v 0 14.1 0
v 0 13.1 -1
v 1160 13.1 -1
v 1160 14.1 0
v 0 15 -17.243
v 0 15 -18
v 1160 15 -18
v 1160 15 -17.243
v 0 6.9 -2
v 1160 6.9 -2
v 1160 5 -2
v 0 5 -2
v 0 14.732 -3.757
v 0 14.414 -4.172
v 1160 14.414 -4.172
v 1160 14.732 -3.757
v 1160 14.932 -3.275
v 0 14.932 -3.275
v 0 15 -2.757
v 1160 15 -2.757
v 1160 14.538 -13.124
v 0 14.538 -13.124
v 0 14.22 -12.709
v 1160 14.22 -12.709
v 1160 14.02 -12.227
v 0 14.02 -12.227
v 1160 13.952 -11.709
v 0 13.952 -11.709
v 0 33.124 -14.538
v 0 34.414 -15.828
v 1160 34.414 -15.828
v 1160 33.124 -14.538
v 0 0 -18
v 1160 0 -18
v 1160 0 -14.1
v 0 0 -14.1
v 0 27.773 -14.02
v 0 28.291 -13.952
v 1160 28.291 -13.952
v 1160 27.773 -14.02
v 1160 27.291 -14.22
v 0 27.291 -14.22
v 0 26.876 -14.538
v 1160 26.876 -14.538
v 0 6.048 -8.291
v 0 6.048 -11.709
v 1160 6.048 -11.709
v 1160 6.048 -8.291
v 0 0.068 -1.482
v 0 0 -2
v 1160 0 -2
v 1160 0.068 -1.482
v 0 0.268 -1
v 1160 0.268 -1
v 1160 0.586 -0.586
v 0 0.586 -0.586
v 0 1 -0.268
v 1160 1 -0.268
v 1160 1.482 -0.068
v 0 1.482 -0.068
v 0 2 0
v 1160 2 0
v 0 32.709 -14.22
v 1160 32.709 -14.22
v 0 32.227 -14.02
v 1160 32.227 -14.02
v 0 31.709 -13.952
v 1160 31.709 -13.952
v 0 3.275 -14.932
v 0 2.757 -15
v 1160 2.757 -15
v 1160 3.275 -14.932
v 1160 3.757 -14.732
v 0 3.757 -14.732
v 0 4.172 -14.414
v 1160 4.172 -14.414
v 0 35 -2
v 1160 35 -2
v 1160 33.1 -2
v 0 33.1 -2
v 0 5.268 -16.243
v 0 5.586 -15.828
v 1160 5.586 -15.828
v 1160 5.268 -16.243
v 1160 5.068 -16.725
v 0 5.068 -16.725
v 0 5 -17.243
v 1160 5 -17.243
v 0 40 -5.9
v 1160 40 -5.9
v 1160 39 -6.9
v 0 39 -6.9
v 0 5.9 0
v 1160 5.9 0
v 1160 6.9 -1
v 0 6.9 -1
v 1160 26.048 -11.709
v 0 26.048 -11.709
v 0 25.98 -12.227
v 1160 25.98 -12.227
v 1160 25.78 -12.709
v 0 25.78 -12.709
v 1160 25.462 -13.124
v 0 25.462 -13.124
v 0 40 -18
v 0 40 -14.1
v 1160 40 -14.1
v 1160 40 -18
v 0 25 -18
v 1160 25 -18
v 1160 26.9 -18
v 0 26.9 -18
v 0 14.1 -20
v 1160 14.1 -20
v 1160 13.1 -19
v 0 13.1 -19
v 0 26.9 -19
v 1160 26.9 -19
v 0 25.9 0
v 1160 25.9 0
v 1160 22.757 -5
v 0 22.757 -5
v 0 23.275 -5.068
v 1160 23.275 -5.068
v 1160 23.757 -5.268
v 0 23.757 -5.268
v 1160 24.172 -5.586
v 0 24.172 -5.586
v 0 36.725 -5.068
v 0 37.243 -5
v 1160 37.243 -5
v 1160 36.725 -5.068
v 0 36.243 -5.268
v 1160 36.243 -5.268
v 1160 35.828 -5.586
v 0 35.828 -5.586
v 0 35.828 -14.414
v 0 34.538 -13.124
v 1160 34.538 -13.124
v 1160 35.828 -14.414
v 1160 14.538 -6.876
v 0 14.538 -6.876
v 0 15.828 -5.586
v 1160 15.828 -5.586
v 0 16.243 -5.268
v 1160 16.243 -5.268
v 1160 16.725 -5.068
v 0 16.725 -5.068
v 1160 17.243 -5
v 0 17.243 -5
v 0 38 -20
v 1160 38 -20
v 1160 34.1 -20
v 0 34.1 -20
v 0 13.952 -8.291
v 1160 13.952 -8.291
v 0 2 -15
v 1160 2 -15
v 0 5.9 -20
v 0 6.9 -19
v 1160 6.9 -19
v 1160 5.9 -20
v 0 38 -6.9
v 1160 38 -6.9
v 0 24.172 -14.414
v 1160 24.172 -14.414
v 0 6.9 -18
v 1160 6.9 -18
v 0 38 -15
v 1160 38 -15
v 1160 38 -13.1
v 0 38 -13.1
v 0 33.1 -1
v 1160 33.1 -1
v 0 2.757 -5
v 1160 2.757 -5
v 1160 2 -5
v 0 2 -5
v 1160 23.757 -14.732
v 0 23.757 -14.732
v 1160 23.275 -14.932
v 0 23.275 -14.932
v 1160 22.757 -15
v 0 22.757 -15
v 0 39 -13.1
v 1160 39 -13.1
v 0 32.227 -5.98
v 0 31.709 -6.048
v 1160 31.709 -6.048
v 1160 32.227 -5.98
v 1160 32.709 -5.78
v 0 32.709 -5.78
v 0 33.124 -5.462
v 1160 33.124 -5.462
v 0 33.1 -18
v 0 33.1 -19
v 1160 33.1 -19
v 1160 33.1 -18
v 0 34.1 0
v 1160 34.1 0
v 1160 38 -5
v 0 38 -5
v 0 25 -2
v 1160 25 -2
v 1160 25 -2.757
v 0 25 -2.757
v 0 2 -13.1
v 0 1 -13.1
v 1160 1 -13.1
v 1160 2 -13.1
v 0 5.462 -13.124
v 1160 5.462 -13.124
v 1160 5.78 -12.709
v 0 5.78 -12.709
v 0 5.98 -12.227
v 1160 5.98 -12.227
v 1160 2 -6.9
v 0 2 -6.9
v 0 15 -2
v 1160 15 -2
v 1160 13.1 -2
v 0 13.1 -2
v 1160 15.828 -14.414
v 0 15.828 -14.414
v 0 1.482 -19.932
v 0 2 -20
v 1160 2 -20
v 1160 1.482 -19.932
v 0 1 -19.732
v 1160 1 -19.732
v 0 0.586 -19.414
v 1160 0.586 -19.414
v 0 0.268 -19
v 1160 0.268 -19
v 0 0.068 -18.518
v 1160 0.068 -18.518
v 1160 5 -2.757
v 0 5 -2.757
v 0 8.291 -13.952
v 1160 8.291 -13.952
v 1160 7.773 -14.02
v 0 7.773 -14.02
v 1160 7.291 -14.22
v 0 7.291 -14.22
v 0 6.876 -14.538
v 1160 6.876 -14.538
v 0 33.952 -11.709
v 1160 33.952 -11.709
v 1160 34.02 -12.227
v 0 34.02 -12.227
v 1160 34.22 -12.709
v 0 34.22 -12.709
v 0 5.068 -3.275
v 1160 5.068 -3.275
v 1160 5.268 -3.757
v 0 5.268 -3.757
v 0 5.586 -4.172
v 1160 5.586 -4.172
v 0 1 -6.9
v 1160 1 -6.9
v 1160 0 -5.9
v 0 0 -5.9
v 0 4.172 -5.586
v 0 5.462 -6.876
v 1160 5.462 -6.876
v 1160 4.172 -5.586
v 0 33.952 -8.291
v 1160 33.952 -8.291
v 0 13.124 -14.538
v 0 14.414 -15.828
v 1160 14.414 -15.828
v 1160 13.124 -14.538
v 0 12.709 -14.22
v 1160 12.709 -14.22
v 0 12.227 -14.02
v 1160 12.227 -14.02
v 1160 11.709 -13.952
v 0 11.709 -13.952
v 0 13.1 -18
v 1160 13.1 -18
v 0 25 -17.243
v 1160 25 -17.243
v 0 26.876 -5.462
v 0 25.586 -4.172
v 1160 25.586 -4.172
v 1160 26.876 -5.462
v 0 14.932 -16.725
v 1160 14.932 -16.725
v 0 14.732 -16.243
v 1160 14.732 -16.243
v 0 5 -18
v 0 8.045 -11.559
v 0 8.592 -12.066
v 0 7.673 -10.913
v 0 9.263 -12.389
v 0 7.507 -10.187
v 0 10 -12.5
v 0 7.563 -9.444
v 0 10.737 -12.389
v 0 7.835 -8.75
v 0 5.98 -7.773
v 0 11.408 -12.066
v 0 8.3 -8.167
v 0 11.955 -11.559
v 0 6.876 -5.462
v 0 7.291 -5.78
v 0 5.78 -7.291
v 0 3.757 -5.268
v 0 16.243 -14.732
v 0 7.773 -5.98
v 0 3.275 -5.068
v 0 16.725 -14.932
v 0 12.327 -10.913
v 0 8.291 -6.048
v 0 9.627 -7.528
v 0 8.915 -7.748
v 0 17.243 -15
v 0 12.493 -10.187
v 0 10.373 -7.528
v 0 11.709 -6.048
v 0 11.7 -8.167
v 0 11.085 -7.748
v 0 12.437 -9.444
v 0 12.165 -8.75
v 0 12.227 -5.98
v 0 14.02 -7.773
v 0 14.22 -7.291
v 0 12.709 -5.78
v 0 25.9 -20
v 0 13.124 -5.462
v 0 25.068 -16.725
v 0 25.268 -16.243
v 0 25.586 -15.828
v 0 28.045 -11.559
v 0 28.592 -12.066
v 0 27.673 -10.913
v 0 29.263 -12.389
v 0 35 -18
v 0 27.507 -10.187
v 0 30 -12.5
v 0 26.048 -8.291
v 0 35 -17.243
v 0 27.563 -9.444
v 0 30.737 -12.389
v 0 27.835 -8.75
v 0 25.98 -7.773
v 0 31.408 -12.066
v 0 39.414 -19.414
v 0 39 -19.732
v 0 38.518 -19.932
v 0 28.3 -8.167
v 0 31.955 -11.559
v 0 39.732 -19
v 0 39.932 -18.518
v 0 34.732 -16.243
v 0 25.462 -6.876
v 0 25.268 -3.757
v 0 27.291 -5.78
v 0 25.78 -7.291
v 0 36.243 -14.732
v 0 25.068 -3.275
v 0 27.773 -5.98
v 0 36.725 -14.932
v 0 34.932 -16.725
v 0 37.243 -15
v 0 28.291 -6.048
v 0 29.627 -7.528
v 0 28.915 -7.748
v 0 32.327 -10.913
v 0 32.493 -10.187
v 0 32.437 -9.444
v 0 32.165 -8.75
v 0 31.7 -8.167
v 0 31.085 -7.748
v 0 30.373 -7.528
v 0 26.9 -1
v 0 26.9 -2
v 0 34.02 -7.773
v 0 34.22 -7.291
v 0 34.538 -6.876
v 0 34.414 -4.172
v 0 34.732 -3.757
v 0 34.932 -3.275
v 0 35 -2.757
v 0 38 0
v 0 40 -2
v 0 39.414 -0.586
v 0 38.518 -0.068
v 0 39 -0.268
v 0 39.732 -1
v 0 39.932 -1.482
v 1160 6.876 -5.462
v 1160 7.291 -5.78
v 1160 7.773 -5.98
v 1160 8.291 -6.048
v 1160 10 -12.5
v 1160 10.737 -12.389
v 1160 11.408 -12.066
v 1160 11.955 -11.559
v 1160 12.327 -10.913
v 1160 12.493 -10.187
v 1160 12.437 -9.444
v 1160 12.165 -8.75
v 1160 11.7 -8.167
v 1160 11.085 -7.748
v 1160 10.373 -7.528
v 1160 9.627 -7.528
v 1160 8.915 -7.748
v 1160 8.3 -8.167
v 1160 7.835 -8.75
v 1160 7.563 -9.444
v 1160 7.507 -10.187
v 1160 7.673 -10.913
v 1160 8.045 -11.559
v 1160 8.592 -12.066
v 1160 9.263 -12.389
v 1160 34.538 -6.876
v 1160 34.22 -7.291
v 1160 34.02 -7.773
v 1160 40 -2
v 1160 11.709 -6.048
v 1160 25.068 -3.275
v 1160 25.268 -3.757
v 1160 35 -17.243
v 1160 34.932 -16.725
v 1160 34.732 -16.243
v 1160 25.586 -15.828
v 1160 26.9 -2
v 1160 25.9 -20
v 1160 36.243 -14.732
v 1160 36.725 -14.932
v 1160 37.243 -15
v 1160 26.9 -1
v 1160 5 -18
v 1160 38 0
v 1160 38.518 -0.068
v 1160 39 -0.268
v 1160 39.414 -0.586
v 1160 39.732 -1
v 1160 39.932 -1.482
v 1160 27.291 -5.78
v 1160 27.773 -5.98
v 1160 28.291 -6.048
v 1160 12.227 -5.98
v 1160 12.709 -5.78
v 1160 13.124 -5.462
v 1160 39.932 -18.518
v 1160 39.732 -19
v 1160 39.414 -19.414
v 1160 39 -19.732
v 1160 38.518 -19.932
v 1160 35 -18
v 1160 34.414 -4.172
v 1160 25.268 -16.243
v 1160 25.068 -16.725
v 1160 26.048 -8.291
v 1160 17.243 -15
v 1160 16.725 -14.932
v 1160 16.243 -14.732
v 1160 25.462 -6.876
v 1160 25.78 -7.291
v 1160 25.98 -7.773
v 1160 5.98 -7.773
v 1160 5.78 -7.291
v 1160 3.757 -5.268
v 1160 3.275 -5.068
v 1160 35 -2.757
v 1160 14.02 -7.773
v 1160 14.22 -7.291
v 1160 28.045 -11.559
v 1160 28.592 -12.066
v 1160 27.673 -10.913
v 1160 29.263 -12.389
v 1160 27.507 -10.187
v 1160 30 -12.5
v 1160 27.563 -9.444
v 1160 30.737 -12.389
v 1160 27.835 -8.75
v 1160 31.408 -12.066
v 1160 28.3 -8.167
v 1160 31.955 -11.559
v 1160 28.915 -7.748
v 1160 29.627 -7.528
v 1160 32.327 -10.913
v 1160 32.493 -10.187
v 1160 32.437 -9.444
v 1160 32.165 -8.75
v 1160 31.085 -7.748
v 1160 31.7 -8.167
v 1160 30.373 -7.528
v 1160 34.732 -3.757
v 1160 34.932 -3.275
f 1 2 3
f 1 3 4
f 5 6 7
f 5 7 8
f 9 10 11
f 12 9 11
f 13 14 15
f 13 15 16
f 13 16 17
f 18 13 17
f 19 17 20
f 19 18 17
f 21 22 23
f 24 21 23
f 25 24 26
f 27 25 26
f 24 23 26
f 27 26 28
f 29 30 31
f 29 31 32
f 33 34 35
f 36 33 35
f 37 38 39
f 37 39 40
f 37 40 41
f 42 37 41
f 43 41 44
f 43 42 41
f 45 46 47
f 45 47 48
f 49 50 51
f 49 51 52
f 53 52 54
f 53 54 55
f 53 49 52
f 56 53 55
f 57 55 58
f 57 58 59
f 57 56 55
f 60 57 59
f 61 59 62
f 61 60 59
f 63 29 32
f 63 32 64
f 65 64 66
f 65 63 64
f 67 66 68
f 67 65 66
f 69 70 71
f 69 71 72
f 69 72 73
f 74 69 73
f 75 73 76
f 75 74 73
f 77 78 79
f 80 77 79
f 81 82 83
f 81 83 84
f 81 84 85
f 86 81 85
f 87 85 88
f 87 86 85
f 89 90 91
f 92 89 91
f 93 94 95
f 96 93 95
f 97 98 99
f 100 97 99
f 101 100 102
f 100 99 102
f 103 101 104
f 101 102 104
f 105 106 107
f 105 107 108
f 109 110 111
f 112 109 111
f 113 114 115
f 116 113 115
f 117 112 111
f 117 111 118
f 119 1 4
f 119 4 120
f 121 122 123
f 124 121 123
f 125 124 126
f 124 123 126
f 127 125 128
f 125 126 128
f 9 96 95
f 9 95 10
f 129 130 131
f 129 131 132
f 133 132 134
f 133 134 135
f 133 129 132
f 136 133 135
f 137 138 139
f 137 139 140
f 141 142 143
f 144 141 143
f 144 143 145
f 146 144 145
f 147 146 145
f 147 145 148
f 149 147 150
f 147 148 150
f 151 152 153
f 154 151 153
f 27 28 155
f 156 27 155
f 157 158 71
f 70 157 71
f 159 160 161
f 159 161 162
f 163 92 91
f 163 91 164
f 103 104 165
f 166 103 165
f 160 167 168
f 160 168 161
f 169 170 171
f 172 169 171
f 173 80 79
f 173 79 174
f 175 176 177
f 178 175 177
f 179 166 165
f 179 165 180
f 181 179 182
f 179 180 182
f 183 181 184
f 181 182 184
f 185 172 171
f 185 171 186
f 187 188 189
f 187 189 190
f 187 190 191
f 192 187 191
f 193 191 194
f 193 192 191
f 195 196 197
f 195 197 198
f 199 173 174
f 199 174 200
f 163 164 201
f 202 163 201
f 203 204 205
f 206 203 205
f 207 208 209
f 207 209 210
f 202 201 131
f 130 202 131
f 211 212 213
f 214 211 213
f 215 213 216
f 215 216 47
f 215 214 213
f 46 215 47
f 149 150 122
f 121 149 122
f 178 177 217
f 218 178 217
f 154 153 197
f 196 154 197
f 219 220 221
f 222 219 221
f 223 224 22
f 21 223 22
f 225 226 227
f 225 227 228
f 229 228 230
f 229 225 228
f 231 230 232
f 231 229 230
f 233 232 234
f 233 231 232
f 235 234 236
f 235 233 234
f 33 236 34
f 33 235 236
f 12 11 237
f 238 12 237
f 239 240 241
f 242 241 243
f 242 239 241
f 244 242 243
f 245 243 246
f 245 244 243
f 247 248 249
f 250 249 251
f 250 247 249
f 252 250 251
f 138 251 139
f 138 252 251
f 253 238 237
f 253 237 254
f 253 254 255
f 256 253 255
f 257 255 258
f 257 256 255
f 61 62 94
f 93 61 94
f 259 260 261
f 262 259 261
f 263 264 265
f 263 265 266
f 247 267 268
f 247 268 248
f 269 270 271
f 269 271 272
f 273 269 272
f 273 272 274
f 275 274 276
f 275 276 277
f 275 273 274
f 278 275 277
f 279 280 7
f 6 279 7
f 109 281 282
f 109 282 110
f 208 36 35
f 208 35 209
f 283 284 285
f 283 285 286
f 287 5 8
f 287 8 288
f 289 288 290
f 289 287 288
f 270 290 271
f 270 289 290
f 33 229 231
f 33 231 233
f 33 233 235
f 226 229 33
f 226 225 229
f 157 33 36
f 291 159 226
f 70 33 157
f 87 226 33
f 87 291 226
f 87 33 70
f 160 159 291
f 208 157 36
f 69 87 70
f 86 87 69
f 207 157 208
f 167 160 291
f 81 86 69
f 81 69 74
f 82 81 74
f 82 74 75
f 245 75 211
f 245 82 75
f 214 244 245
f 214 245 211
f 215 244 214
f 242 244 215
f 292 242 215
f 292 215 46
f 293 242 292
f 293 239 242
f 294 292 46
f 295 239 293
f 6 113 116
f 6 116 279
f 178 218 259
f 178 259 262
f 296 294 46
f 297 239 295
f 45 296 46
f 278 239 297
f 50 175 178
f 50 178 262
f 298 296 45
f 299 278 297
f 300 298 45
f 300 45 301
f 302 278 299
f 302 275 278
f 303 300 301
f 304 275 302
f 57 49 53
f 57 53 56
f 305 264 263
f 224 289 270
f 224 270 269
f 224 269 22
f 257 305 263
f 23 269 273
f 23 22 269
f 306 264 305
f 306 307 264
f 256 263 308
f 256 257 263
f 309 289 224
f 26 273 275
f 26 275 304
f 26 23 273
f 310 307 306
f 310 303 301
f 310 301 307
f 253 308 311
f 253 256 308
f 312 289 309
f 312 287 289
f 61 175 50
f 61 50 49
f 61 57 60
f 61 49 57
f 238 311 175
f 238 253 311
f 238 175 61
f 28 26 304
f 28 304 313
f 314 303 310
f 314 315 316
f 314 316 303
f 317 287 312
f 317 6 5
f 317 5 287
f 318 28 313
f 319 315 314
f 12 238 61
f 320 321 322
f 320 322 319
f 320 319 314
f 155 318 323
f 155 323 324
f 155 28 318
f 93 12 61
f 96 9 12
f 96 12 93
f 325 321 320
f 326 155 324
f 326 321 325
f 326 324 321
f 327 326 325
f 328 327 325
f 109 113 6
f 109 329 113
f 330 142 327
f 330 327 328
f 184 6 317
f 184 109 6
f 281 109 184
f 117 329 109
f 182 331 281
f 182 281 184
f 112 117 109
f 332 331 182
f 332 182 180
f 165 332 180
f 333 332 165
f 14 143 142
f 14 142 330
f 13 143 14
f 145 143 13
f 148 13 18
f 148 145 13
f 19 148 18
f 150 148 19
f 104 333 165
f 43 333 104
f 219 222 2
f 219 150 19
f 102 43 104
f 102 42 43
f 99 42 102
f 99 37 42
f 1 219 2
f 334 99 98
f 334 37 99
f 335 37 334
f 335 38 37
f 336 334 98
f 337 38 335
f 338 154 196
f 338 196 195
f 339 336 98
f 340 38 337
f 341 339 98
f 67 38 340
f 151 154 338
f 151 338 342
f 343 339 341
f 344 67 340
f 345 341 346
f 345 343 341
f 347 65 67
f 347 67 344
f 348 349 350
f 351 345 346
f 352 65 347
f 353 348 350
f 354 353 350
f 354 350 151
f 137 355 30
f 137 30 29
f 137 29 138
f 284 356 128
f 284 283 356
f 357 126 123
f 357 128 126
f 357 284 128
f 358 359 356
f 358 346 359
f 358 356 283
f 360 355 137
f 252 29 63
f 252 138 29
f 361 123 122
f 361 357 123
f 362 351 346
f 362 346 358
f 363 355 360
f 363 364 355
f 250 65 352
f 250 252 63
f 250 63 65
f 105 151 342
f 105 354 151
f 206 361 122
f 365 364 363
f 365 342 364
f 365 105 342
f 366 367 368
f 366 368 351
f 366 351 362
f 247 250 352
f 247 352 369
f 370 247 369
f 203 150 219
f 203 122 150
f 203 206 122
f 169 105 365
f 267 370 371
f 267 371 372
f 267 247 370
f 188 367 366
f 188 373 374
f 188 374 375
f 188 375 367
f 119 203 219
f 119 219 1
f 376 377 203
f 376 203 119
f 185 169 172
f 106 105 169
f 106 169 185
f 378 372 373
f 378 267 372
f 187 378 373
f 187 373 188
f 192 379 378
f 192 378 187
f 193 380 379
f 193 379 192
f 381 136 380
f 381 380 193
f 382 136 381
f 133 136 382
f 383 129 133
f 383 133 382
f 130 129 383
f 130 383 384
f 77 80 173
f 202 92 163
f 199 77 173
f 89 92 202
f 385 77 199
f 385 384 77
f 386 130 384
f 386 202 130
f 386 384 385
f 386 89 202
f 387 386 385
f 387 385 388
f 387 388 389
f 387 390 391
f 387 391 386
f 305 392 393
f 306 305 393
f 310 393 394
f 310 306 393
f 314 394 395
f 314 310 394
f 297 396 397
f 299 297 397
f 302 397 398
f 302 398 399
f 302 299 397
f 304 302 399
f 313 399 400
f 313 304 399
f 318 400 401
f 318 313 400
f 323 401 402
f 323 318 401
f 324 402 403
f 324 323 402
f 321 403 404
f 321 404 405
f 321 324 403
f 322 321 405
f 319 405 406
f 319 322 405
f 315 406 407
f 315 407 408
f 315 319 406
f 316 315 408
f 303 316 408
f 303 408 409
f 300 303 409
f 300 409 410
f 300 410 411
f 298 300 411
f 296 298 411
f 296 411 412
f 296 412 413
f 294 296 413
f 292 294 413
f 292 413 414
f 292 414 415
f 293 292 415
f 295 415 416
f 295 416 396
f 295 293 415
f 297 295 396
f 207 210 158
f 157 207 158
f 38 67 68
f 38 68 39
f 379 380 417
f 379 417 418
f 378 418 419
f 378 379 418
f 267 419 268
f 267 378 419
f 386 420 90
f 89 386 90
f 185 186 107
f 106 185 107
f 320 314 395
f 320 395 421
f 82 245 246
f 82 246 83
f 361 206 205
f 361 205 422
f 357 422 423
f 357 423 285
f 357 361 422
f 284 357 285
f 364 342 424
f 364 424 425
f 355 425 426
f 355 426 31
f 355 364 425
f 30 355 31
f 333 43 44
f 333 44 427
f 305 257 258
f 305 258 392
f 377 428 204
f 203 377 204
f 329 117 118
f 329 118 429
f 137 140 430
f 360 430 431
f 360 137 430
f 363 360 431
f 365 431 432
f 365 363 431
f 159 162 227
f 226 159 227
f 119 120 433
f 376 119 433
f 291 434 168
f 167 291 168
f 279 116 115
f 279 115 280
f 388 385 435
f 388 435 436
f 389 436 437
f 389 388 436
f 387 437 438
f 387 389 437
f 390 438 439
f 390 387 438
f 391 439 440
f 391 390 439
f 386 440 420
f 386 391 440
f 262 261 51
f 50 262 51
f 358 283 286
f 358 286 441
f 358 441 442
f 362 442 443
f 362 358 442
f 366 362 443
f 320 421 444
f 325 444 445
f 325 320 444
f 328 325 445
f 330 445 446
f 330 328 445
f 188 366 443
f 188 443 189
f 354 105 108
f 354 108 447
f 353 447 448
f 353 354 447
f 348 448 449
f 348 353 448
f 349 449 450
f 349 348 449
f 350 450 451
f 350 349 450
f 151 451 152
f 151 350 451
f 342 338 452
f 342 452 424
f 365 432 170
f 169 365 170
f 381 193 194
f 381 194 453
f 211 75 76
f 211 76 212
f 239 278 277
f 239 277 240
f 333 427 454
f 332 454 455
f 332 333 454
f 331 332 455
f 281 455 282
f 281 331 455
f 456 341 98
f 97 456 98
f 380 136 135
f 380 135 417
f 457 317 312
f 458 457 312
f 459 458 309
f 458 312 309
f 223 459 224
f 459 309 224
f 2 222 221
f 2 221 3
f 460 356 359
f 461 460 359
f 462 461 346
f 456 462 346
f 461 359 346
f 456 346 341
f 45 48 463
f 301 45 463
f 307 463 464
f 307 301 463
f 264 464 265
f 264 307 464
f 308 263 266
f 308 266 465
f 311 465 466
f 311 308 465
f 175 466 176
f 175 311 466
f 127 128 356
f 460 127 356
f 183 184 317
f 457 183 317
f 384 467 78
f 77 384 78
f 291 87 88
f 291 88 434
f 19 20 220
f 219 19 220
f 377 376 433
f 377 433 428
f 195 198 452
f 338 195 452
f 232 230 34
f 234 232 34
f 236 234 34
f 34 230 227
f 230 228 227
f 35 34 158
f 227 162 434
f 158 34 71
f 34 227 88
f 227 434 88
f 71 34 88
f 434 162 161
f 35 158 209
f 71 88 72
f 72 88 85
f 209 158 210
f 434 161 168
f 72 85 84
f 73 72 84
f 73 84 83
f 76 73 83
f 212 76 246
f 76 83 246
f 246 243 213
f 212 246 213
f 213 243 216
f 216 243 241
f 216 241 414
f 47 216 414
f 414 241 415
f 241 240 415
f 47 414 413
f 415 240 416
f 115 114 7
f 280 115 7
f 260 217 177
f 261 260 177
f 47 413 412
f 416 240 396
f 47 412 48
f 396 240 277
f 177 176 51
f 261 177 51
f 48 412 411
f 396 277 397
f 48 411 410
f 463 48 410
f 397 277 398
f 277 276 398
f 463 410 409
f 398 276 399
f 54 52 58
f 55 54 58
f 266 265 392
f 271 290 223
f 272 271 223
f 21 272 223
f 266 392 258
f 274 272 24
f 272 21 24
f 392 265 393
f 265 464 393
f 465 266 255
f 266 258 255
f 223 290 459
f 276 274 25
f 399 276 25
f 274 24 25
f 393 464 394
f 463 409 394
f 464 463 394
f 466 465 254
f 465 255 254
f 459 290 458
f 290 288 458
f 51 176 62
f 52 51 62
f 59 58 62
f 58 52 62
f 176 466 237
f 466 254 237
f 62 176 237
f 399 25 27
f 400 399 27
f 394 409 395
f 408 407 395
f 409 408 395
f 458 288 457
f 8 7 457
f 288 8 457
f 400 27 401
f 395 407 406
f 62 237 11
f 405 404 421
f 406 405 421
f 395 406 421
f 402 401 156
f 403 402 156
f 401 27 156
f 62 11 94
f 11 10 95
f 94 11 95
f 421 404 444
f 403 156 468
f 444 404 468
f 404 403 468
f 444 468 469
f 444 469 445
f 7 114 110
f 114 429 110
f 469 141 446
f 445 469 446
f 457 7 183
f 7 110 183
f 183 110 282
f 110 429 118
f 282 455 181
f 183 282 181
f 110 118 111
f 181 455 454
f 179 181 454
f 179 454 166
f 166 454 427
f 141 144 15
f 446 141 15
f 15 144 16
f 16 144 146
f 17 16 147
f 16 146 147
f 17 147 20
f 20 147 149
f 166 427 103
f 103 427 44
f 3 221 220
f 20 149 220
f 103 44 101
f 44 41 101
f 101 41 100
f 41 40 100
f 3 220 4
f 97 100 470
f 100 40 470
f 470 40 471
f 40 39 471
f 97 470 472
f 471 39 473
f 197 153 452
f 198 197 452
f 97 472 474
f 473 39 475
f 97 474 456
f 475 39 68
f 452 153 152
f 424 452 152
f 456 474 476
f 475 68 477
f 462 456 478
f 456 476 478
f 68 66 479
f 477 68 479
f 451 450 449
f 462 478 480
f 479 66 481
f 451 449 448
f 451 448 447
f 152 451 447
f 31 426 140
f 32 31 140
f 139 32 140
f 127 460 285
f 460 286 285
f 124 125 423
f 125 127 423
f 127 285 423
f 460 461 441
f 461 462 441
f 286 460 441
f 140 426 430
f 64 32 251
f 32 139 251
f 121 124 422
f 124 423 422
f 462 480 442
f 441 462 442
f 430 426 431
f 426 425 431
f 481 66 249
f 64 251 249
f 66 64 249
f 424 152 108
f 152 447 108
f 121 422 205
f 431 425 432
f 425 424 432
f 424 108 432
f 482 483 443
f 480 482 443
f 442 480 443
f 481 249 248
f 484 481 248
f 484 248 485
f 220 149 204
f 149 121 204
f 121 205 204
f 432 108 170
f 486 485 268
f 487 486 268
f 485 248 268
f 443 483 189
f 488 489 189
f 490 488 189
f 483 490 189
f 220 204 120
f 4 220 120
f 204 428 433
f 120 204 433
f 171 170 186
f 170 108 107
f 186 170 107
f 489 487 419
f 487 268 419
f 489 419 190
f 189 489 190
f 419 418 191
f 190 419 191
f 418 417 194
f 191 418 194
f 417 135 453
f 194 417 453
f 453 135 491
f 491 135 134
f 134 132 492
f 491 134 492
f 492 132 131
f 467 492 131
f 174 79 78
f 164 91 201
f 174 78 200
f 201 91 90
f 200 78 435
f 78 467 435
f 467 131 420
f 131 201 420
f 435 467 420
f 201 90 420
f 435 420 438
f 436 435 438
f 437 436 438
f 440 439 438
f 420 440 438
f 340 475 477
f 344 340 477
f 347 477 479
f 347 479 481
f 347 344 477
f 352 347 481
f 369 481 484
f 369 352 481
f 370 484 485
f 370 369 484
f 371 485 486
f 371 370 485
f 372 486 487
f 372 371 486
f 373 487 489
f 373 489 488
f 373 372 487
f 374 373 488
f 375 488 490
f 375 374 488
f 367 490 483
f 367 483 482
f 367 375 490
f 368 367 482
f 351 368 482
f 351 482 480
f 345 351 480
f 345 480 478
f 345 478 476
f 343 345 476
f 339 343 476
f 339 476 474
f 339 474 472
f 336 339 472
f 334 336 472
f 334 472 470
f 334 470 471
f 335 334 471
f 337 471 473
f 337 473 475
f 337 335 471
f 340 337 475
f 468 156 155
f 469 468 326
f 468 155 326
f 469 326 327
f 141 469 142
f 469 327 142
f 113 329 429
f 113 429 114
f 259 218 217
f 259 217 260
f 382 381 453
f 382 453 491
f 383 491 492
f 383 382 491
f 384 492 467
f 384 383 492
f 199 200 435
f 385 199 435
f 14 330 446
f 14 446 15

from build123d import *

# Parameters (mm, degrees)
SKETCH1_R           = 2.5
BOSS_EXTRUDE1_DEPTH = 1160


with BuildPart() as part:
    # Sketch1 → Boss-Extrude1 (new body)
    with BuildSketch(Plane(origin=(0, 0, 0), x_dir=(0, 0, -1), z_dir=(1, 0, 0))):
        with BuildLine():
            Line((6.9, 38), (5, 38))
            Line((5, 38), (5, 37.242640687))
            ThreePointArc((5, 37.242640687), (5.152240935, 36.477273822), (5.585786438, 35.828427125))
            Line((5.585786438, 35.828427125), (6.876358939, 34.537854624))
            ThreePointArc((6.876358939, 34.537854624), (7.525205636, 34.104309121), (8.290572501, 33.952068186))
            Line((8.290572501, 33.952068186), (11.709427499, 33.952068186))
            ThreePointArc((11.709427499, 33.952068186), (12.474794364, 34.104309121), (13.123641061, 34.537854624))
            Line((13.123641061, 34.537854624), (14.414213562, 35.828427125))
            ThreePointArc((14.414213562, 35.828427125), (14.847759065, 36.477273822), (15, 37.242640687))
            Line((15, 37.242640687), (15, 38))
            Line((15, 38), (13.1, 38))
            Line((13.1, 38), (13.1, 39))
            Line((13.1, 39), (14.1, 40))
            Line((14.1, 40), (18, 40))
            ThreePointArc((18, 40), (19.414213562, 39.414213562), (20, 38))
            Line((20, 38), (20, 34.1))
            Line((20, 34.1), (19, 33.1))
            Line((19, 33.1), (18, 33.1))
            Line((18, 33.1), (18, 35))
            Line((18, 35), (17.242640687, 35))
            ThreePointArc((17.242640687, 35), (16.477273822, 34.847759065), (15.828427125, 34.414213562))
            Line((15.828427125, 34.414213562), (14.537854624, 33.123641061))
            ThreePointArc((14.537854624, 33.123641061), (14.104309121, 32.474794364), (13.952068186, 31.709427499))
            Line((13.952068186, 31.709427499), (13.952068186, 28.290572501))
            ThreePointArc((13.952068186, 28.290572501), (14.104309121, 27.525205636), (14.537854624, 26.876358939))
            Line((14.537854624, 26.876358939), (15.828427125, 25.585786438))
            ThreePointArc((15.828427125, 25.585786438), (16.477273822, 25.152240935), (17.242640687, 25))
            Line((17.242640687, 25), (18, 25))
            Line((18, 25), (18, 26.9))
            Line((18, 26.9), (19, 26.9))
            Line((19, 26.9), (20, 25.9))
            Line((20, 25.9), (20, 14.1))
            Line((20, 14.1), (19, 13.1))
            Line((19, 13.1), (18, 13.1))
            Line((18, 13.1), (18, 15))
            Line((18, 15), (17.242640687, 15))
            ThreePointArc((17.242640687, 15), (16.477273822, 14.847759065), (15.828427125, 14.414213562))
            Line((15.828427125, 14.414213562), (14.537854624, 13.123641061))
            ThreePointArc((14.537854624, 13.123641061), (14.104309121, 12.474794364), (13.952068186, 11.709427499))
            Line((13.952068186, 11.709427499), (13.952068186, 8.290572501))
            ThreePointArc((13.952068186, 8.290572501), (14.104309121, 7.525205636), (14.537854624, 6.876358939))
            Line((14.537854624, 6.876358939), (15.828427125, 5.585786438))
            ThreePointArc((15.828427125, 5.585786438), (16.477273822, 5.152240935), (17.242640687, 5))
            Line((17.242640687, 5), (18, 5))
            Line((18, 5), (18, 6.9))
            Line((18, 6.9), (19, 6.9))
            Line((19, 6.9), (20, 5.9))
            Line((20, 5.9), (20, 2))
            ThreePointArc((20, 2), (19.414213562, 0.585786438), (18, 0))
            Line((18, 0), (14.1, 0))
            Line((14.1, 0), (13.1, 1))
            Line((13.1, 1), (13.1, 2))
            Line((13.1, 2), (15, 2))
            Line((15, 2), (15, 2.757359313))
            ThreePointArc((15, 2.757359313), (14.847759065, 3.522726178), (14.414213562, 4.171572875))
            Line((14.414213562, 4.171572875), (13.123641061, 5.462145376))
            ThreePointArc((13.123641061, 5.462145376), (12.474794364, 5.895690879), (11.709427499, 6.047931814))
            Line((11.709427499, 6.047931814), (8.290572501, 6.047931814))
            ThreePointArc((8.290572501, 6.047931814), (7.525205636, 5.895690879), (6.876358939, 5.462145376))
            Line((6.876358939, 5.462145376), (5.585786438, 4.171572875))
            ThreePointArc((5.585786438, 4.171572875), (5.152240935, 3.522726178), (5, 2.757359313))
            Line((5, 2.757359313), (5, 2))
            Line((5, 2), (6.9, 2))
            Line((6.9, 2), (6.9, 1))
            Line((6.9, 1), (5.9, 0))
            Line((5.9, 0), (2, 0))
            ThreePointArc((2, 0), (0.585786438, 0.585786438), (0, 2))
            Line((0, 2), (0, 5.9))
            Line((0, 5.9), (1, 6.9))
            Line((1, 6.9), (2, 6.9))
            Line((2, 6.9), (2, 5))
            Line((2, 5), (2.757359313, 5))
            ThreePointArc((2.757359313, 5), (3.522726178, 5.152240935), (4.171572875, 5.585786438))
            Line((4.171572875, 5.585786438), (5.462145376, 6.876358939))
            ThreePointArc((5.462145376, 6.876358939), (5.895690879, 7.525205636), (6.047931814, 8.290572501))
            Line((6.047931814, 8.290572501), (6.047931814, 11.709427499))
            ThreePointArc((6.047931814, 11.709427499), (5.895690879, 12.474794364), (5.462145376, 13.123641061))
            Line((5.462145376, 13.123641061), (4.171572875, 14.414213562))
            ThreePointArc((4.171572875, 14.414213562), (3.522726178, 14.847759065), (2.757359313, 15))
            Line((2.757359313, 15), (2, 15))
            Line((2, 15), (2, 13.1))
            Line((2, 13.1), (1, 13.1))
            Line((1, 13.1), (0, 14.1))
            Line((0, 14.1), (0, 25.9))
            Line((0, 25.9), (1, 26.9))
            Line((1, 26.9), (2, 26.9))
            Line((2, 26.9), (2, 25))
            Line((2, 25), (2.757359313, 25))
            ThreePointArc((2.757359313, 25), (3.522726178, 25.152240935), (4.171572875, 25.585786438))
            Line((4.171572875, 25.585786438), (5.462145376, 26.876358939))
            ThreePointArc((5.462145376, 26.876358939), (5.895690879, 27.525205636), (6.047931814, 28.290572501))
            Line((6.047931814, 28.290572501), (6.047931814, 31.709427499))
            ThreePointArc((6.047931814, 31.709427499), (5.895690879, 32.474794364), (5.462145376, 33.123641061))
            Line((5.462145376, 33.123641061), (4.171572875, 34.414213562))
            ThreePointArc((4.171572875, 34.414213562), (3.522726178, 34.847759065), (2.757359313, 35))
            Line((2.757359313, 35), (2, 35))
            Line((2, 35), (2, 33.1))
            Line((2, 33.1), (1, 33.1))
            Line((1, 33.1), (0, 34.1))
            Line((0, 34.1), (0, 38))
            ThreePointArc((0, 38), (0.585786438, 39.414213562), (2, 40))
            Line((2, 40), (5.9, 40))
            Line((5.9, 40), (6.9, 39))
            Line((6.9, 39), (6.9, 38))
        make_face()
        with Locations((10, 10)):
            Circle(SKETCH1_R, mode=Mode.SUBTRACT)
        with Locations((10, 30)):
            Circle(SKETCH1_R, mode=Mode.SUBTRACT)
        with BuildLine():
            Line((14.414213562, 15.828427125), (13.123641061, 14.537854624))
            ThreePointArc((13.123641061, 14.537854624), (12.474794364, 14.104309121), (11.709427499, 13.952068186))
            Line((11.709427499, 13.952068186), (8.290572501, 13.952068186))
            ThreePointArc((8.290572501, 13.952068186), (7.525205636, 14.104309121), (6.876358939, 14.537854624))
            Line((6.876358939, 14.537854624), (5.585786438, 15.828427125))
            ThreePointArc((5.585786438, 15.828427125), (5.152240935, 16.477273822), (5, 17.242640687))
            Line((5, 17.242640687), (5, 22.757359313))
            ThreePointArc((5, 22.757359313), (5.152240935, 23.522726178), (5.585786438, 24.171572875))
            Line((5.585786438, 24.171572875), (6.876358939, 25.462145376))
            ThreePointArc((6.876358939, 25.462145376), (7.525205636, 25.895690879), (8.290572501, 26.047931814))
            Line((8.290572501, 26.047931814), (11.709427499, 26.047931814))
            ThreePointArc((11.709427499, 26.047931814), (12.474794364, 25.895690879), (13.123641061, 25.462145376))
            Line((13.123641061, 25.462145376), (14.414213562, 24.171572875))
            ThreePointArc((14.414213562, 24.171572875), (14.847759065, 23.522726178), (15, 22.757359313))
            Line((15, 22.757359313), (15, 17.242640687))
            ThreePointArc((15, 17.242640687), (14.847759065, 16.477273822), (14.414213562, 15.828427125))
        make_face(mode=Mode.SUBTRACT)
    extrude(amount=BOSS_EXTRUDE1_DEPTH)


solid = part.part
